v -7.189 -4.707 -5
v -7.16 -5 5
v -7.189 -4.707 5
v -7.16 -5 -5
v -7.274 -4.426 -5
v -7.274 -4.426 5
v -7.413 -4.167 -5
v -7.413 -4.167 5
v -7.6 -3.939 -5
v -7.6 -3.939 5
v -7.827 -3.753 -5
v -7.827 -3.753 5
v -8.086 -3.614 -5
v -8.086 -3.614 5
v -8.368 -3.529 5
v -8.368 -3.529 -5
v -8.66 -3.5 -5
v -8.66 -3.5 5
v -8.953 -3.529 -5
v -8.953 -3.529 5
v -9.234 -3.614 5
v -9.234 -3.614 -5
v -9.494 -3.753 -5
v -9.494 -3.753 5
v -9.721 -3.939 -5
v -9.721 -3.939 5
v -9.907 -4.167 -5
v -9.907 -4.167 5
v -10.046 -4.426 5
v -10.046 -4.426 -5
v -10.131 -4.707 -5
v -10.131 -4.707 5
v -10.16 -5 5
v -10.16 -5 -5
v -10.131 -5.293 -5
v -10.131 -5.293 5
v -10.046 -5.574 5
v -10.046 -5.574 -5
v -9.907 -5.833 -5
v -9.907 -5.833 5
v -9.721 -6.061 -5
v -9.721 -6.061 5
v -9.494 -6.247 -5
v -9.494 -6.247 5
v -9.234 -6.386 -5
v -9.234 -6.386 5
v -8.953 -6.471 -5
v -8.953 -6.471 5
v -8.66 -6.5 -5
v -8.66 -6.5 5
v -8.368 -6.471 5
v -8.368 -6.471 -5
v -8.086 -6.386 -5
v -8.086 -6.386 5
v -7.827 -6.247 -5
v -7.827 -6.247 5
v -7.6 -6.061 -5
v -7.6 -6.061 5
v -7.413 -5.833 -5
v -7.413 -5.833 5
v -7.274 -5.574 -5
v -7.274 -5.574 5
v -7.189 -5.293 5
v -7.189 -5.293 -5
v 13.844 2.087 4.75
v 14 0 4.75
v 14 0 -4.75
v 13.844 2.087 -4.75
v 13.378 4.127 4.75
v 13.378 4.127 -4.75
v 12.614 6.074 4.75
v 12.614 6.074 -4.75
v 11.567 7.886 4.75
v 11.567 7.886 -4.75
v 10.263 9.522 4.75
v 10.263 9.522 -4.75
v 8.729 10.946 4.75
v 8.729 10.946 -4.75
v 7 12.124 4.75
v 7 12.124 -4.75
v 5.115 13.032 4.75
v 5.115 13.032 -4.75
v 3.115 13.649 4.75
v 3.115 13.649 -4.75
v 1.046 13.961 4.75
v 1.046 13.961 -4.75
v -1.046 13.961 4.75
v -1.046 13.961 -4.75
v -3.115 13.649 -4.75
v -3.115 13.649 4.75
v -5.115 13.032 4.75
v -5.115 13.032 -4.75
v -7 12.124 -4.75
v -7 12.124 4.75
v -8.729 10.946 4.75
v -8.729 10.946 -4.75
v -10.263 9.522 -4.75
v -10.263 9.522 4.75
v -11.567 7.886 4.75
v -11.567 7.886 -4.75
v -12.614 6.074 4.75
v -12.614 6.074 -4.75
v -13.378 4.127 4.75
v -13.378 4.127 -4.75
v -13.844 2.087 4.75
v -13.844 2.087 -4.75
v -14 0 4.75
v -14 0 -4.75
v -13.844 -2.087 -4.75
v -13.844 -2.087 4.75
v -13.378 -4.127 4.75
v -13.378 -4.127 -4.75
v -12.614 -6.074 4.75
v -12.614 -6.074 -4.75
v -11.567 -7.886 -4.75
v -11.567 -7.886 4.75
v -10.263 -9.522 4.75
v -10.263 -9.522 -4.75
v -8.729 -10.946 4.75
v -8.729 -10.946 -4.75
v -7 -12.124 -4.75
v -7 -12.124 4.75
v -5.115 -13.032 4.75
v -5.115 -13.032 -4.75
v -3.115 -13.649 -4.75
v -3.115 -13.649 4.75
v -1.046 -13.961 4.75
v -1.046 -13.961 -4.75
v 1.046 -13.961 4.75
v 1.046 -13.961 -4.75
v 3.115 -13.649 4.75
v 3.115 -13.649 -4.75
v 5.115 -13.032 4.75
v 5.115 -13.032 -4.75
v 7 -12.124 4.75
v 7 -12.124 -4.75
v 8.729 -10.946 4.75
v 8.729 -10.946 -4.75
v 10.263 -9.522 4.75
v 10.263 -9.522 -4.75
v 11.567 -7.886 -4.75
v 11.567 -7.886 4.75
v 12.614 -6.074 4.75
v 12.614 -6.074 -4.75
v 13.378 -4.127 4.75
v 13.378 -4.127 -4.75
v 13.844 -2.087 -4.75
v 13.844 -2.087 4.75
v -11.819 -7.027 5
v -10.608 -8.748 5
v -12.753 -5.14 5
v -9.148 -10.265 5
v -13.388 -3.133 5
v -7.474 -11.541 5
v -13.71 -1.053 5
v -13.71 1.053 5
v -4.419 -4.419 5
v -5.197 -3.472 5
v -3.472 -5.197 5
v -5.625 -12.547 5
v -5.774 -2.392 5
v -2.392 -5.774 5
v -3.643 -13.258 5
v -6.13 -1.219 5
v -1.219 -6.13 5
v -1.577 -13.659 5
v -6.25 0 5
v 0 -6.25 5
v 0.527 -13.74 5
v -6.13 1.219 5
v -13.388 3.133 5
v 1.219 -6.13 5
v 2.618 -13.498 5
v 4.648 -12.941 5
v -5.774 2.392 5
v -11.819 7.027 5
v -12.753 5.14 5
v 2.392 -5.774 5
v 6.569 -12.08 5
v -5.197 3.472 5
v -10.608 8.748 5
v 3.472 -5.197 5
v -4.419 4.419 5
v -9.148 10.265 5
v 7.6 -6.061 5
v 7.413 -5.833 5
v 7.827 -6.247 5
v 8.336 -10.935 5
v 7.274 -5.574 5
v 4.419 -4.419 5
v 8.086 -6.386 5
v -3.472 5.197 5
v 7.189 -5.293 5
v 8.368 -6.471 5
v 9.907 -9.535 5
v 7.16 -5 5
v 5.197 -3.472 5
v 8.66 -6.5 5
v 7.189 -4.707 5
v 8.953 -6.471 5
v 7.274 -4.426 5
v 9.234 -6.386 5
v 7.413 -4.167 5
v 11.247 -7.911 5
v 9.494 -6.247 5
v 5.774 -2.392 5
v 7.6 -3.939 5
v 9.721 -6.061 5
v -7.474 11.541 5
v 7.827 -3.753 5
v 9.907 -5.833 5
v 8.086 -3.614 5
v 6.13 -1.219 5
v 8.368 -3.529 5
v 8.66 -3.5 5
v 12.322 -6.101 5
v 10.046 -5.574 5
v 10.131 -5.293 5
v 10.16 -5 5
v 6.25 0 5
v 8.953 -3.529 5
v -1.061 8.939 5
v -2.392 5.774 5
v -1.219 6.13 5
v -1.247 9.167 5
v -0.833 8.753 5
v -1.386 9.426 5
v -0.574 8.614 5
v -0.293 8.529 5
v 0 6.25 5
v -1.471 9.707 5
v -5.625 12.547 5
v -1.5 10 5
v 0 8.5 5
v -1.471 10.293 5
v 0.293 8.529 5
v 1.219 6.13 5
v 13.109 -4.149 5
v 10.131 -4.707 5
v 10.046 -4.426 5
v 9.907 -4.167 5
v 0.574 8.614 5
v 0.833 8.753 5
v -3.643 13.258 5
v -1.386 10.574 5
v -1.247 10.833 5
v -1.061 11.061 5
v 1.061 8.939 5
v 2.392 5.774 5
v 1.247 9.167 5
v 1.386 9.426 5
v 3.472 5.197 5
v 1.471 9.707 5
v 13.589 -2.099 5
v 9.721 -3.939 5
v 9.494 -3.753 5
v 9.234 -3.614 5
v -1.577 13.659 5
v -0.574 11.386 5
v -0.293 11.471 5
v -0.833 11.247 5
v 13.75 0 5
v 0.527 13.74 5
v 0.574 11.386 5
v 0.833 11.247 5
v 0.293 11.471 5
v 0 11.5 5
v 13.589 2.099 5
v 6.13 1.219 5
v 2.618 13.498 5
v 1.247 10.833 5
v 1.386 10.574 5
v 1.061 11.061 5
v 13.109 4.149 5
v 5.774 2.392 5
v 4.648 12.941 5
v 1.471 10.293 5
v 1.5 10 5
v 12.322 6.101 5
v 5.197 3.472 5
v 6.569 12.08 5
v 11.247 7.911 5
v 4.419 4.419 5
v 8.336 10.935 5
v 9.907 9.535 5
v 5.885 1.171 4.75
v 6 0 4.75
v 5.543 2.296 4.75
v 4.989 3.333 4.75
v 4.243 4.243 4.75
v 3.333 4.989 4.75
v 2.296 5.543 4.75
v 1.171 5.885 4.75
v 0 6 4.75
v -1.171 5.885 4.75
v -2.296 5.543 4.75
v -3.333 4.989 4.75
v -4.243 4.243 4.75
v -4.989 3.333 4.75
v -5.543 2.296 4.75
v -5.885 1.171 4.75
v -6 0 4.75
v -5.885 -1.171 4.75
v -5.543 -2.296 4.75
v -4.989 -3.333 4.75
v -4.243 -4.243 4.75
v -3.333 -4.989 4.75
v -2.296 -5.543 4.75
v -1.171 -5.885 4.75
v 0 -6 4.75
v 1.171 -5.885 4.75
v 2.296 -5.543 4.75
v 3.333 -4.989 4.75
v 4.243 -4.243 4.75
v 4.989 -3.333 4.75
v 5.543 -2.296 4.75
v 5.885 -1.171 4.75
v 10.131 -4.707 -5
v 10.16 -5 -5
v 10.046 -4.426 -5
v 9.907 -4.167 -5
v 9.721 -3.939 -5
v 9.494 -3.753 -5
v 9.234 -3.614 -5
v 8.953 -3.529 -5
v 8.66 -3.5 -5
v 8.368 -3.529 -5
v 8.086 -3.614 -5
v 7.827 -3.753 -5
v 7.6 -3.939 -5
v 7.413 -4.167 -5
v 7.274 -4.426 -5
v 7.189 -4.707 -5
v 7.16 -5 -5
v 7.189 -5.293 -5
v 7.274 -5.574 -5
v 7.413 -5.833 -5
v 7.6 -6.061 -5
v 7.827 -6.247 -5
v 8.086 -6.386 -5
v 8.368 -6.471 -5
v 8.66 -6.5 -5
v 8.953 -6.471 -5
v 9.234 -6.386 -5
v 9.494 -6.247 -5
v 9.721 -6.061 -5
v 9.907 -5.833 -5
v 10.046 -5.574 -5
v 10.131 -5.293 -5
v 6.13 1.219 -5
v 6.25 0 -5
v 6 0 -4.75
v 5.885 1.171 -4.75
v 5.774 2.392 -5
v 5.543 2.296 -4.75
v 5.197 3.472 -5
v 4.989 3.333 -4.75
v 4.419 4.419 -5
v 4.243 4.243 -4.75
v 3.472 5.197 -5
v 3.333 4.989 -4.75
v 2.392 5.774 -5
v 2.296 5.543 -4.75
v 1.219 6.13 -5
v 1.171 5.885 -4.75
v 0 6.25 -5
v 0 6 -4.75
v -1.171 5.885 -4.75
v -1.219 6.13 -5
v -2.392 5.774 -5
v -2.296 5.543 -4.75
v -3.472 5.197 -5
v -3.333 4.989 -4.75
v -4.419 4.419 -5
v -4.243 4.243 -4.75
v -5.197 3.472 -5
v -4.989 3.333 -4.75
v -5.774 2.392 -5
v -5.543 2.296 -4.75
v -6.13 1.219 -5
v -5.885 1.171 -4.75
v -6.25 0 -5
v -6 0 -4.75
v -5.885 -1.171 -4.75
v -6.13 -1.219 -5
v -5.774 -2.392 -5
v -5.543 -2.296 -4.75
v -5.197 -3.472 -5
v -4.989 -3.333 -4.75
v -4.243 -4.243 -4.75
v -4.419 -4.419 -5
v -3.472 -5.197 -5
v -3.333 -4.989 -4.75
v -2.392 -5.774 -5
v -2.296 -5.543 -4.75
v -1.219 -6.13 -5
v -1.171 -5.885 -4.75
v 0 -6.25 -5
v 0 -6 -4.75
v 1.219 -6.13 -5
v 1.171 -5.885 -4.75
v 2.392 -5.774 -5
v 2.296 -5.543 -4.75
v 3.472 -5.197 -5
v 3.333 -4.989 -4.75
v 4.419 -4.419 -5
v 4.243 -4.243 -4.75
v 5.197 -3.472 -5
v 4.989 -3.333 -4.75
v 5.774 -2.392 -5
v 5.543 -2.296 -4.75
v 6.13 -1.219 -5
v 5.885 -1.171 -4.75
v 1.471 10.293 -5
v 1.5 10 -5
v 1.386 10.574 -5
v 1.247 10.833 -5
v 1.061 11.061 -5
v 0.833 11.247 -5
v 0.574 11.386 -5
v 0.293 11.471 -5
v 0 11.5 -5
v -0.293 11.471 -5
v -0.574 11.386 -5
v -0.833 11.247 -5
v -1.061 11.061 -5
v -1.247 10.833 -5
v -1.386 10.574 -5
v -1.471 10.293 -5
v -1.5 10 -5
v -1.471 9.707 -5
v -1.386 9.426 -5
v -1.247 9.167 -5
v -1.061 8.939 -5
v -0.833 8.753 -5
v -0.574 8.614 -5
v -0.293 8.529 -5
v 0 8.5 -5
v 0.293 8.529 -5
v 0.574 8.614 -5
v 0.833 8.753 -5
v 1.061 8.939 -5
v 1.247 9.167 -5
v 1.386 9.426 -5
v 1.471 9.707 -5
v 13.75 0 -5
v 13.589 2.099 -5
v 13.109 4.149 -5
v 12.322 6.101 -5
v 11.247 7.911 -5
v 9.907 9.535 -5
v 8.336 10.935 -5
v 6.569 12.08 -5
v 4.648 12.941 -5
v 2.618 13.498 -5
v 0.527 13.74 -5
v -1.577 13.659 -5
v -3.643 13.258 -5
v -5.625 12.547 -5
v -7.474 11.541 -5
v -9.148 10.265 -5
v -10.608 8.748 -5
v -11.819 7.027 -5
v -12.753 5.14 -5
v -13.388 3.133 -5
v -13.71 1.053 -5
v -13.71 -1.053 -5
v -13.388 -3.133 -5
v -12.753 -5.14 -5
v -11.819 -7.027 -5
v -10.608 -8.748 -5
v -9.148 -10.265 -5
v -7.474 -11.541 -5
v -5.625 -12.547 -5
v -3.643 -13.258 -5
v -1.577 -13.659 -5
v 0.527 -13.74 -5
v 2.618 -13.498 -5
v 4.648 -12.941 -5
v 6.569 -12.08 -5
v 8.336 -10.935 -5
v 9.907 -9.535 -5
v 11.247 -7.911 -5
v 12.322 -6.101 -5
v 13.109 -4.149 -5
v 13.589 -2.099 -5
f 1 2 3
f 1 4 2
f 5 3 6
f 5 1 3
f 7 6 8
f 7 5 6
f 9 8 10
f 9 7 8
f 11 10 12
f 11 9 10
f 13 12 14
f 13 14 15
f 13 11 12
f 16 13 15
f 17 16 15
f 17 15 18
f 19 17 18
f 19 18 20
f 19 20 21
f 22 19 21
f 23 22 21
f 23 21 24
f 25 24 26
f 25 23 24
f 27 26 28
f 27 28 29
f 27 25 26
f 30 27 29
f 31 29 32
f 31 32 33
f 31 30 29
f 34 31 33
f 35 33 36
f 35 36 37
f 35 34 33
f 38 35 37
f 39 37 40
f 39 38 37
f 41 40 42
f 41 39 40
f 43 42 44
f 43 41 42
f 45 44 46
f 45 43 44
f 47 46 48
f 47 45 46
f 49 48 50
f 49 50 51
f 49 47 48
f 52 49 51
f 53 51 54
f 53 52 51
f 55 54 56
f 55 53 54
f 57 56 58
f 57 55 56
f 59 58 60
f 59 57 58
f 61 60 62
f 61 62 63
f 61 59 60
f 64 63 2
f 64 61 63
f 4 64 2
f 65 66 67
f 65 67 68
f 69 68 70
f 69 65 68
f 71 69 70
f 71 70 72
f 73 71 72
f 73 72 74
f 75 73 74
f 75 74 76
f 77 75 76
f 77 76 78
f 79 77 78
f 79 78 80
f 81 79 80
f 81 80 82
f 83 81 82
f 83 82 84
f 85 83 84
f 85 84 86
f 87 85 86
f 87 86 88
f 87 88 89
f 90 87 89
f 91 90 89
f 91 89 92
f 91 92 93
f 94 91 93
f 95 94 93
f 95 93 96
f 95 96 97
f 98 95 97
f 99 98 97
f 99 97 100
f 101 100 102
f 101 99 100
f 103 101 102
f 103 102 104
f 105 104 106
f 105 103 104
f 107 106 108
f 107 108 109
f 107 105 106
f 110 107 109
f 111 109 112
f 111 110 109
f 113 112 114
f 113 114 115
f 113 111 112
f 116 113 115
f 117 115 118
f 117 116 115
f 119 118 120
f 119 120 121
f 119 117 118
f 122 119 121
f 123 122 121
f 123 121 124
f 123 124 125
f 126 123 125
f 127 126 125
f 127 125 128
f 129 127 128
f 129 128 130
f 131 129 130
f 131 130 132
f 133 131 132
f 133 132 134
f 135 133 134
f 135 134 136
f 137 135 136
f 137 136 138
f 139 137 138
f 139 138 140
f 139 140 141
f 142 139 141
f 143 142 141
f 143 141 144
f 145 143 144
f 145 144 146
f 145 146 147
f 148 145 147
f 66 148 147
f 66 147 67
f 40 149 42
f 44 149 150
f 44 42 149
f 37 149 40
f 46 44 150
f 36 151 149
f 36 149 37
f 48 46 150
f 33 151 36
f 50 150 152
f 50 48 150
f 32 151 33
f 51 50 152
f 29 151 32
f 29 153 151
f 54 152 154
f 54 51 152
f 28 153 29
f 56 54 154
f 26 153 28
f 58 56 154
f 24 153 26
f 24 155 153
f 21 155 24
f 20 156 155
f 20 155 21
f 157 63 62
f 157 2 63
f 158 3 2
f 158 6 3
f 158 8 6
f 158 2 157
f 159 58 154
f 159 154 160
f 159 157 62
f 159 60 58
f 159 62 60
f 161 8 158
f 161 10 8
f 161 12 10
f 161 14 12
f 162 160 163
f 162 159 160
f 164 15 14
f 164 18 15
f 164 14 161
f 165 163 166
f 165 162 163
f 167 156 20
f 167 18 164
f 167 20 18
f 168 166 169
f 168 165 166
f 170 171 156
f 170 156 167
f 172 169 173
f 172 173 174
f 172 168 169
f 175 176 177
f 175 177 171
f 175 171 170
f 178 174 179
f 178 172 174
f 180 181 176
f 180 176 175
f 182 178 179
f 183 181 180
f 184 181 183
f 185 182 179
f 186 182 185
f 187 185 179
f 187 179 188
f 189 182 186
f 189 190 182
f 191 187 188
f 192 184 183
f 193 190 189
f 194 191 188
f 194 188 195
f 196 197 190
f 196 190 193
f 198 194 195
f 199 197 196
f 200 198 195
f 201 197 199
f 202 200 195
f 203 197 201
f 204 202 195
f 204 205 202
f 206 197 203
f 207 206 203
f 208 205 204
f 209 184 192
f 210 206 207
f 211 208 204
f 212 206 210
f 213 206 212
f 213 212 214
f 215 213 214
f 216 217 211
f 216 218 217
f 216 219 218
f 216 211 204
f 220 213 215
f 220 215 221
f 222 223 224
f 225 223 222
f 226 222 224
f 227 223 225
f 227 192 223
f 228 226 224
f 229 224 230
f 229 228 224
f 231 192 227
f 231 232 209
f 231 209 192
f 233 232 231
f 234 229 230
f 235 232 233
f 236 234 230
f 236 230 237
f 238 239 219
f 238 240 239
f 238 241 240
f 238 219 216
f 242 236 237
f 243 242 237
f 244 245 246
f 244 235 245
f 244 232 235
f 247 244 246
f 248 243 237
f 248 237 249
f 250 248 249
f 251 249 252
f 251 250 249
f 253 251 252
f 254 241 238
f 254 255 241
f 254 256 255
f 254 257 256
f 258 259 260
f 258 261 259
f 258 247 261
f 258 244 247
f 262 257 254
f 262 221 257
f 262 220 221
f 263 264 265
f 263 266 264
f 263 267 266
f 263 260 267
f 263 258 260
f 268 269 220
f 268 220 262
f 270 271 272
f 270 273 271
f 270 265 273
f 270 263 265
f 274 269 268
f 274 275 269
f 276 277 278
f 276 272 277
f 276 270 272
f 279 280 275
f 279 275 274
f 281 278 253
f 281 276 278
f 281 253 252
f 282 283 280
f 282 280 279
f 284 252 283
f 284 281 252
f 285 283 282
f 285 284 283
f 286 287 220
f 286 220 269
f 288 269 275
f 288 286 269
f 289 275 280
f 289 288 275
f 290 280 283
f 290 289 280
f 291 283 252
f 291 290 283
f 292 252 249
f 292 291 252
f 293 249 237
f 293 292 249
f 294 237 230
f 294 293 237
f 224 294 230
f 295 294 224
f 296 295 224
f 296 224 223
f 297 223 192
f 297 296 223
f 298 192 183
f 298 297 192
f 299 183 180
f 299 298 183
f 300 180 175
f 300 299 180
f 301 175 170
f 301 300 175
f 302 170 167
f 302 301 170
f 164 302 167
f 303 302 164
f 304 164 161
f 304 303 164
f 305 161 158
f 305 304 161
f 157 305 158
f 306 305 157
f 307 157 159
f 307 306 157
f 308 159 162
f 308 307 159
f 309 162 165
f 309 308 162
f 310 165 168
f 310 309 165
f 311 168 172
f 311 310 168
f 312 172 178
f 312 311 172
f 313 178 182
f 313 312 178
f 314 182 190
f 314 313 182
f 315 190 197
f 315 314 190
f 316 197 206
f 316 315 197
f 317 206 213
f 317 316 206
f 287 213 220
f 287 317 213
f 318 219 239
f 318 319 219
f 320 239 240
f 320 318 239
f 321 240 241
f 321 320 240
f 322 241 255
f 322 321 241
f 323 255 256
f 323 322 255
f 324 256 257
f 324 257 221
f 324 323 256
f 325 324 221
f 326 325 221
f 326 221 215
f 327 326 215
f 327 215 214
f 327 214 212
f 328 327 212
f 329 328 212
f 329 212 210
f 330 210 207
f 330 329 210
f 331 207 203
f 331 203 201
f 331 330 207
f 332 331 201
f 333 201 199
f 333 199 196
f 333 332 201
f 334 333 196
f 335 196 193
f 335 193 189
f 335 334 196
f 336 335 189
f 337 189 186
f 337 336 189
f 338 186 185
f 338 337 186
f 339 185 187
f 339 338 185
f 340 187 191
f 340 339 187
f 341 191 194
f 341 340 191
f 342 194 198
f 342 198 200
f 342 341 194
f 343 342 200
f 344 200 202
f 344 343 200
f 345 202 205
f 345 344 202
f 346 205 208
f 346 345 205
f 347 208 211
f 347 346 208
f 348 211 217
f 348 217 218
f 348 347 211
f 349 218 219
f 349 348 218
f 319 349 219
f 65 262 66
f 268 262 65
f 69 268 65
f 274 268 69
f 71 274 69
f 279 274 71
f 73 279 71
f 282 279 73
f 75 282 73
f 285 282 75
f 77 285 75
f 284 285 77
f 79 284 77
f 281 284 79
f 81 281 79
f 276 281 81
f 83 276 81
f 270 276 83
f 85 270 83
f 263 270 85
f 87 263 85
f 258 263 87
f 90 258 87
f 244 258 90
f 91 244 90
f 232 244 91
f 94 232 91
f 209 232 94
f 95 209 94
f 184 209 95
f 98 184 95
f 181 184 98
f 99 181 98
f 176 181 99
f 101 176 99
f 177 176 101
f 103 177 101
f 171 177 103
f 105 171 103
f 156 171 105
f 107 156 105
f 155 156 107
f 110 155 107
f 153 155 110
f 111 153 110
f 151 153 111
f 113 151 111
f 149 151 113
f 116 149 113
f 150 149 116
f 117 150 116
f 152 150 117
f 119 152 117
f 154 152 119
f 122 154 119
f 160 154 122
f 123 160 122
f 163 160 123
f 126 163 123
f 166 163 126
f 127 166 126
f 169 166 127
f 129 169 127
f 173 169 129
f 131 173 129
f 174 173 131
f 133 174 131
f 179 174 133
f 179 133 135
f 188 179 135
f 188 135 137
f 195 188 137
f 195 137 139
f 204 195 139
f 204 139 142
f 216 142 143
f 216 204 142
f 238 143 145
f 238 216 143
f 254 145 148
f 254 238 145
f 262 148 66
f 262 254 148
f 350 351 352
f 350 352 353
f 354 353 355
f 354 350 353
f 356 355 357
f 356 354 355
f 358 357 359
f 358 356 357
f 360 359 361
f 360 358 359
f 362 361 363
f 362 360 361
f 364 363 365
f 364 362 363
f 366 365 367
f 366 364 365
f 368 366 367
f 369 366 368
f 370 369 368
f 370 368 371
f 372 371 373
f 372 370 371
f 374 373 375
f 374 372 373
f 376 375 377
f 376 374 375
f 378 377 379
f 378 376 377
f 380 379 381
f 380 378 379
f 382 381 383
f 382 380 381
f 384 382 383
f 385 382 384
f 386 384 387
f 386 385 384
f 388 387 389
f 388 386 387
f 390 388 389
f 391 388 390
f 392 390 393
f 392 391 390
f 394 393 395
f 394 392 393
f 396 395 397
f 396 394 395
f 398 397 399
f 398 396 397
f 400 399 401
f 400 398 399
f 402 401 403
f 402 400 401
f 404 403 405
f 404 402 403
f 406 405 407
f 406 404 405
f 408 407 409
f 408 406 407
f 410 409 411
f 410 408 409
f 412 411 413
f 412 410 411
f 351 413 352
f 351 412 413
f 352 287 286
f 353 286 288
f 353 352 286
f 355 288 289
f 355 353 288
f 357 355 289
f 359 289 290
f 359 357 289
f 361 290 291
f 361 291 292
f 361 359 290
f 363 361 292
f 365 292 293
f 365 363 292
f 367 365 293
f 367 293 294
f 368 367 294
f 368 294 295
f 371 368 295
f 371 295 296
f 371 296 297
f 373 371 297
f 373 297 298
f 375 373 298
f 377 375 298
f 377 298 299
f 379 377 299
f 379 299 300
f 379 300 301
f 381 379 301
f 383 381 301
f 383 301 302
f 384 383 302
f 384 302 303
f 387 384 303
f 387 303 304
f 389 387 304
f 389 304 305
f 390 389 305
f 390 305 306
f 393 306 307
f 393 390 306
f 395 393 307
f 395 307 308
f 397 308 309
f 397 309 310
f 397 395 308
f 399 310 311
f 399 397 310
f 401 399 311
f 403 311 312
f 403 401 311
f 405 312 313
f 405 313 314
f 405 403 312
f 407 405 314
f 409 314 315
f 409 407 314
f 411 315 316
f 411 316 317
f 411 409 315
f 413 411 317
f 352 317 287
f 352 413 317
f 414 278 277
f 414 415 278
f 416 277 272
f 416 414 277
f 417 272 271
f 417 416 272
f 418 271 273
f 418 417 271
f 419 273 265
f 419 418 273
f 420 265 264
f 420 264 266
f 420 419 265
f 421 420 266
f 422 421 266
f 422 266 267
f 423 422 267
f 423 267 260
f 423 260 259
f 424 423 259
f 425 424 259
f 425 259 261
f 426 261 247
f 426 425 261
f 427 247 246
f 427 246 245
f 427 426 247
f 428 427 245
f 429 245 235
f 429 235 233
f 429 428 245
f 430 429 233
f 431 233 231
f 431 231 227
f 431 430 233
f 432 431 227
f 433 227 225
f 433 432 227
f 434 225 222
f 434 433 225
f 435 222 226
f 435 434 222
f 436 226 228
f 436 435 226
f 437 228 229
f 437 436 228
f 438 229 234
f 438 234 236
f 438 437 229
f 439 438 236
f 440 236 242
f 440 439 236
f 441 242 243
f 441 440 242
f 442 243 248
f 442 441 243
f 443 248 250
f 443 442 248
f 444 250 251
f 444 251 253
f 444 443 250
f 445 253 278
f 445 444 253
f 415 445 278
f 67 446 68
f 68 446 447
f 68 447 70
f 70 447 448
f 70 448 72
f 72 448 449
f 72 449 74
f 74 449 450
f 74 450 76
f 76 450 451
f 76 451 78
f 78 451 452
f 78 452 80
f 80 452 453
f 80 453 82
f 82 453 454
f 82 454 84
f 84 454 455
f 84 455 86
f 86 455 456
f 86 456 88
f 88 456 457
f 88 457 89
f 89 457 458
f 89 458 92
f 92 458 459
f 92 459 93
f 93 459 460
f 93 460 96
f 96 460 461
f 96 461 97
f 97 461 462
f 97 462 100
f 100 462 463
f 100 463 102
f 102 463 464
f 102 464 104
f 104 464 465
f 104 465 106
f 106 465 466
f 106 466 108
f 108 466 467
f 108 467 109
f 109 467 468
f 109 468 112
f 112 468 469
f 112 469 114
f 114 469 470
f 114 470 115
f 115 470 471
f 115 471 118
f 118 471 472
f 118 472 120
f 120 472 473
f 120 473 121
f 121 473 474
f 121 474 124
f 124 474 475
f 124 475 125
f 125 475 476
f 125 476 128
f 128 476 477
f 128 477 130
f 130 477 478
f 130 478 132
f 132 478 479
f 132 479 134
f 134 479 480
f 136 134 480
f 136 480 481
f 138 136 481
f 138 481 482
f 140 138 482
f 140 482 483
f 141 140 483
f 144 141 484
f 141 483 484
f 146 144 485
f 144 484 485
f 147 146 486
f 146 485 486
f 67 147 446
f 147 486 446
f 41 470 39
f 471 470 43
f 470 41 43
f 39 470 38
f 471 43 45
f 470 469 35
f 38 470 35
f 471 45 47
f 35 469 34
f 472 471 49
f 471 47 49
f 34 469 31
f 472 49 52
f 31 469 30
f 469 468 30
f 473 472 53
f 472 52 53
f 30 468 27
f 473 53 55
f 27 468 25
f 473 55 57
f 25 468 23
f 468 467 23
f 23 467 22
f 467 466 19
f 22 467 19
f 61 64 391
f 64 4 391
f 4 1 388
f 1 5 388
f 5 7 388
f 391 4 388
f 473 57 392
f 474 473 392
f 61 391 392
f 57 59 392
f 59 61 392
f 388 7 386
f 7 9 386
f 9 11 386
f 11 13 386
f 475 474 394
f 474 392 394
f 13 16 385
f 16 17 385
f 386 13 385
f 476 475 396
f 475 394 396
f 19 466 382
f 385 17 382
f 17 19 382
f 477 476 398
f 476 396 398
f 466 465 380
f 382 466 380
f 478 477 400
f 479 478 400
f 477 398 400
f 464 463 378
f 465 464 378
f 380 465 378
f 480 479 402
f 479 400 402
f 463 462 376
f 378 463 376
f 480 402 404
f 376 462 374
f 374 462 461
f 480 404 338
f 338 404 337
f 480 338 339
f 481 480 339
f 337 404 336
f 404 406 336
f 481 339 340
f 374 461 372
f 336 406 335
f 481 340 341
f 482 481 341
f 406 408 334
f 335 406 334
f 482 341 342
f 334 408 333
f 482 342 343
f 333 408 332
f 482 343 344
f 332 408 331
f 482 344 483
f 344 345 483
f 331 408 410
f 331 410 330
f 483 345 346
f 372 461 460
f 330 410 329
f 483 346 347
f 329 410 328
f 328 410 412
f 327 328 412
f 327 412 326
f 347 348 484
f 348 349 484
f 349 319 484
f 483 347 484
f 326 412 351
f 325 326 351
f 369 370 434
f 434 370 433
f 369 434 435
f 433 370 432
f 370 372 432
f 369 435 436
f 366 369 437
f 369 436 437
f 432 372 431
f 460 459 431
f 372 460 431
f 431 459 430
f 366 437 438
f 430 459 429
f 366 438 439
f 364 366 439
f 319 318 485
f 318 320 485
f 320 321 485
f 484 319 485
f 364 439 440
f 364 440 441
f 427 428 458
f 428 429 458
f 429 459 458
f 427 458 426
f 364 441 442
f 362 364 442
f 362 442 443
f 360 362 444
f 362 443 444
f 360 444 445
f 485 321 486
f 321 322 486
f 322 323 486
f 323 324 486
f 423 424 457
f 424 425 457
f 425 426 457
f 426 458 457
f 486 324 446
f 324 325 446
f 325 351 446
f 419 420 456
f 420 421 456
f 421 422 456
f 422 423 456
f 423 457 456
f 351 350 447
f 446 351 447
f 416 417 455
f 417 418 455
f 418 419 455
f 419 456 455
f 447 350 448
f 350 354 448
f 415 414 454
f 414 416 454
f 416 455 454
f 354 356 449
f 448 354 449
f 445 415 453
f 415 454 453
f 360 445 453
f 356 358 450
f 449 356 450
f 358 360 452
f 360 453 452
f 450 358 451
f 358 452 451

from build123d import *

# Parameters (mm, degrees)
SKETCH1_R           = 14
SKETCH1_R_2         = 6
SKETCH1_R_3         = 1.5
BOSS_EXTRUDE1_DEPTH = 5
CHAMFER1_SIZE       = 0.25


with BuildPart() as part:
    # Sketch1 → Boss-Extrude1 (new body, symmetric)
    with BuildSketch(Plane.XY):
        Circle(SKETCH1_R)
        Circle(SKETCH1_R_2, mode=Mode.SUBTRACT)
        with Locations((0, 10)):
            Circle(SKETCH1_R_3, mode=Mode.SUBTRACT)
        with Locations((8.660254038, -5)):
            Circle(SKETCH1_R_3, mode=Mode.SUBTRACT)
        with Locations((-8.660254038, -5)):
            Circle(SKETCH1_R_3, mode=Mode.SUBTRACT)
    extrude(amount=BOSS_EXTRUDE1_DEPTH, both=True)

    # Chamfer1
    chamfer1_edges = [part.edges().sort_by_distance(p)[0] for p in [
        (-14, 0, -5),
        (-14, 0, 5),
        (-6, 0, -5),
        (-6, 0, 5),
    ]]
    chamfer(chamfer1_edges, length=CHAMFER1_SIZE)


solid = part.part
